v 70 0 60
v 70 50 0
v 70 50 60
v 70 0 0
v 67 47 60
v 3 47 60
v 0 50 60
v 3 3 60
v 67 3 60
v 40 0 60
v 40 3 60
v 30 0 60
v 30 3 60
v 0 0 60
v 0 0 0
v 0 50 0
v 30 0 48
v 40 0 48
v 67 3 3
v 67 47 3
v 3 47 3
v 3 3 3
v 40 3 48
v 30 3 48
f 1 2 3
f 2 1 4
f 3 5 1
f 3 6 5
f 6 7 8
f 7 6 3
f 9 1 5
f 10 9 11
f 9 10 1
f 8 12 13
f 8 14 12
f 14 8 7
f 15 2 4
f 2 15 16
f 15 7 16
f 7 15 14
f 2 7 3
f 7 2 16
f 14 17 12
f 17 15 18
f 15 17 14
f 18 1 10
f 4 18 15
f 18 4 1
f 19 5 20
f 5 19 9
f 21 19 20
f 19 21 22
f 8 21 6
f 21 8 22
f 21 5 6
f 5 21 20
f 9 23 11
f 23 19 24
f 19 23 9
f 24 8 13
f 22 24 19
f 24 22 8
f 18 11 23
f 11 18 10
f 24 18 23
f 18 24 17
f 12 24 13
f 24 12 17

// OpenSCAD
$fn = 32;

// ----------------------------------------------------------------------
// Enclosure box: notch enclosure
// ----------------------------------------------------------------------

// --- parameters (mm) ---
box_l = 70;               // outer length, X
box_w = 50;               // outer width, Y
box_h = 60;               // outer height
wall_t = 3;               // wall thickness
notch_w = 10;             // cable notch width
notch_h = 12;             // cable notch height

inner_h = box_h - wall_t;  // cavity depth
boss_h = inner_h - 2;  // corner boss height

difference() {
  cube([box_l, box_w, box_h]);
  translate([wall_t, wall_t, wall_t])
    cube([box_l - 2 * wall_t, box_w - 2 * wall_t, box_h]);
  translate([box_l / 2 - notch_w / 2, -1, box_h - notch_h])
    cube([notch_w, wall_t + 2, notch_h + 1]);
}
